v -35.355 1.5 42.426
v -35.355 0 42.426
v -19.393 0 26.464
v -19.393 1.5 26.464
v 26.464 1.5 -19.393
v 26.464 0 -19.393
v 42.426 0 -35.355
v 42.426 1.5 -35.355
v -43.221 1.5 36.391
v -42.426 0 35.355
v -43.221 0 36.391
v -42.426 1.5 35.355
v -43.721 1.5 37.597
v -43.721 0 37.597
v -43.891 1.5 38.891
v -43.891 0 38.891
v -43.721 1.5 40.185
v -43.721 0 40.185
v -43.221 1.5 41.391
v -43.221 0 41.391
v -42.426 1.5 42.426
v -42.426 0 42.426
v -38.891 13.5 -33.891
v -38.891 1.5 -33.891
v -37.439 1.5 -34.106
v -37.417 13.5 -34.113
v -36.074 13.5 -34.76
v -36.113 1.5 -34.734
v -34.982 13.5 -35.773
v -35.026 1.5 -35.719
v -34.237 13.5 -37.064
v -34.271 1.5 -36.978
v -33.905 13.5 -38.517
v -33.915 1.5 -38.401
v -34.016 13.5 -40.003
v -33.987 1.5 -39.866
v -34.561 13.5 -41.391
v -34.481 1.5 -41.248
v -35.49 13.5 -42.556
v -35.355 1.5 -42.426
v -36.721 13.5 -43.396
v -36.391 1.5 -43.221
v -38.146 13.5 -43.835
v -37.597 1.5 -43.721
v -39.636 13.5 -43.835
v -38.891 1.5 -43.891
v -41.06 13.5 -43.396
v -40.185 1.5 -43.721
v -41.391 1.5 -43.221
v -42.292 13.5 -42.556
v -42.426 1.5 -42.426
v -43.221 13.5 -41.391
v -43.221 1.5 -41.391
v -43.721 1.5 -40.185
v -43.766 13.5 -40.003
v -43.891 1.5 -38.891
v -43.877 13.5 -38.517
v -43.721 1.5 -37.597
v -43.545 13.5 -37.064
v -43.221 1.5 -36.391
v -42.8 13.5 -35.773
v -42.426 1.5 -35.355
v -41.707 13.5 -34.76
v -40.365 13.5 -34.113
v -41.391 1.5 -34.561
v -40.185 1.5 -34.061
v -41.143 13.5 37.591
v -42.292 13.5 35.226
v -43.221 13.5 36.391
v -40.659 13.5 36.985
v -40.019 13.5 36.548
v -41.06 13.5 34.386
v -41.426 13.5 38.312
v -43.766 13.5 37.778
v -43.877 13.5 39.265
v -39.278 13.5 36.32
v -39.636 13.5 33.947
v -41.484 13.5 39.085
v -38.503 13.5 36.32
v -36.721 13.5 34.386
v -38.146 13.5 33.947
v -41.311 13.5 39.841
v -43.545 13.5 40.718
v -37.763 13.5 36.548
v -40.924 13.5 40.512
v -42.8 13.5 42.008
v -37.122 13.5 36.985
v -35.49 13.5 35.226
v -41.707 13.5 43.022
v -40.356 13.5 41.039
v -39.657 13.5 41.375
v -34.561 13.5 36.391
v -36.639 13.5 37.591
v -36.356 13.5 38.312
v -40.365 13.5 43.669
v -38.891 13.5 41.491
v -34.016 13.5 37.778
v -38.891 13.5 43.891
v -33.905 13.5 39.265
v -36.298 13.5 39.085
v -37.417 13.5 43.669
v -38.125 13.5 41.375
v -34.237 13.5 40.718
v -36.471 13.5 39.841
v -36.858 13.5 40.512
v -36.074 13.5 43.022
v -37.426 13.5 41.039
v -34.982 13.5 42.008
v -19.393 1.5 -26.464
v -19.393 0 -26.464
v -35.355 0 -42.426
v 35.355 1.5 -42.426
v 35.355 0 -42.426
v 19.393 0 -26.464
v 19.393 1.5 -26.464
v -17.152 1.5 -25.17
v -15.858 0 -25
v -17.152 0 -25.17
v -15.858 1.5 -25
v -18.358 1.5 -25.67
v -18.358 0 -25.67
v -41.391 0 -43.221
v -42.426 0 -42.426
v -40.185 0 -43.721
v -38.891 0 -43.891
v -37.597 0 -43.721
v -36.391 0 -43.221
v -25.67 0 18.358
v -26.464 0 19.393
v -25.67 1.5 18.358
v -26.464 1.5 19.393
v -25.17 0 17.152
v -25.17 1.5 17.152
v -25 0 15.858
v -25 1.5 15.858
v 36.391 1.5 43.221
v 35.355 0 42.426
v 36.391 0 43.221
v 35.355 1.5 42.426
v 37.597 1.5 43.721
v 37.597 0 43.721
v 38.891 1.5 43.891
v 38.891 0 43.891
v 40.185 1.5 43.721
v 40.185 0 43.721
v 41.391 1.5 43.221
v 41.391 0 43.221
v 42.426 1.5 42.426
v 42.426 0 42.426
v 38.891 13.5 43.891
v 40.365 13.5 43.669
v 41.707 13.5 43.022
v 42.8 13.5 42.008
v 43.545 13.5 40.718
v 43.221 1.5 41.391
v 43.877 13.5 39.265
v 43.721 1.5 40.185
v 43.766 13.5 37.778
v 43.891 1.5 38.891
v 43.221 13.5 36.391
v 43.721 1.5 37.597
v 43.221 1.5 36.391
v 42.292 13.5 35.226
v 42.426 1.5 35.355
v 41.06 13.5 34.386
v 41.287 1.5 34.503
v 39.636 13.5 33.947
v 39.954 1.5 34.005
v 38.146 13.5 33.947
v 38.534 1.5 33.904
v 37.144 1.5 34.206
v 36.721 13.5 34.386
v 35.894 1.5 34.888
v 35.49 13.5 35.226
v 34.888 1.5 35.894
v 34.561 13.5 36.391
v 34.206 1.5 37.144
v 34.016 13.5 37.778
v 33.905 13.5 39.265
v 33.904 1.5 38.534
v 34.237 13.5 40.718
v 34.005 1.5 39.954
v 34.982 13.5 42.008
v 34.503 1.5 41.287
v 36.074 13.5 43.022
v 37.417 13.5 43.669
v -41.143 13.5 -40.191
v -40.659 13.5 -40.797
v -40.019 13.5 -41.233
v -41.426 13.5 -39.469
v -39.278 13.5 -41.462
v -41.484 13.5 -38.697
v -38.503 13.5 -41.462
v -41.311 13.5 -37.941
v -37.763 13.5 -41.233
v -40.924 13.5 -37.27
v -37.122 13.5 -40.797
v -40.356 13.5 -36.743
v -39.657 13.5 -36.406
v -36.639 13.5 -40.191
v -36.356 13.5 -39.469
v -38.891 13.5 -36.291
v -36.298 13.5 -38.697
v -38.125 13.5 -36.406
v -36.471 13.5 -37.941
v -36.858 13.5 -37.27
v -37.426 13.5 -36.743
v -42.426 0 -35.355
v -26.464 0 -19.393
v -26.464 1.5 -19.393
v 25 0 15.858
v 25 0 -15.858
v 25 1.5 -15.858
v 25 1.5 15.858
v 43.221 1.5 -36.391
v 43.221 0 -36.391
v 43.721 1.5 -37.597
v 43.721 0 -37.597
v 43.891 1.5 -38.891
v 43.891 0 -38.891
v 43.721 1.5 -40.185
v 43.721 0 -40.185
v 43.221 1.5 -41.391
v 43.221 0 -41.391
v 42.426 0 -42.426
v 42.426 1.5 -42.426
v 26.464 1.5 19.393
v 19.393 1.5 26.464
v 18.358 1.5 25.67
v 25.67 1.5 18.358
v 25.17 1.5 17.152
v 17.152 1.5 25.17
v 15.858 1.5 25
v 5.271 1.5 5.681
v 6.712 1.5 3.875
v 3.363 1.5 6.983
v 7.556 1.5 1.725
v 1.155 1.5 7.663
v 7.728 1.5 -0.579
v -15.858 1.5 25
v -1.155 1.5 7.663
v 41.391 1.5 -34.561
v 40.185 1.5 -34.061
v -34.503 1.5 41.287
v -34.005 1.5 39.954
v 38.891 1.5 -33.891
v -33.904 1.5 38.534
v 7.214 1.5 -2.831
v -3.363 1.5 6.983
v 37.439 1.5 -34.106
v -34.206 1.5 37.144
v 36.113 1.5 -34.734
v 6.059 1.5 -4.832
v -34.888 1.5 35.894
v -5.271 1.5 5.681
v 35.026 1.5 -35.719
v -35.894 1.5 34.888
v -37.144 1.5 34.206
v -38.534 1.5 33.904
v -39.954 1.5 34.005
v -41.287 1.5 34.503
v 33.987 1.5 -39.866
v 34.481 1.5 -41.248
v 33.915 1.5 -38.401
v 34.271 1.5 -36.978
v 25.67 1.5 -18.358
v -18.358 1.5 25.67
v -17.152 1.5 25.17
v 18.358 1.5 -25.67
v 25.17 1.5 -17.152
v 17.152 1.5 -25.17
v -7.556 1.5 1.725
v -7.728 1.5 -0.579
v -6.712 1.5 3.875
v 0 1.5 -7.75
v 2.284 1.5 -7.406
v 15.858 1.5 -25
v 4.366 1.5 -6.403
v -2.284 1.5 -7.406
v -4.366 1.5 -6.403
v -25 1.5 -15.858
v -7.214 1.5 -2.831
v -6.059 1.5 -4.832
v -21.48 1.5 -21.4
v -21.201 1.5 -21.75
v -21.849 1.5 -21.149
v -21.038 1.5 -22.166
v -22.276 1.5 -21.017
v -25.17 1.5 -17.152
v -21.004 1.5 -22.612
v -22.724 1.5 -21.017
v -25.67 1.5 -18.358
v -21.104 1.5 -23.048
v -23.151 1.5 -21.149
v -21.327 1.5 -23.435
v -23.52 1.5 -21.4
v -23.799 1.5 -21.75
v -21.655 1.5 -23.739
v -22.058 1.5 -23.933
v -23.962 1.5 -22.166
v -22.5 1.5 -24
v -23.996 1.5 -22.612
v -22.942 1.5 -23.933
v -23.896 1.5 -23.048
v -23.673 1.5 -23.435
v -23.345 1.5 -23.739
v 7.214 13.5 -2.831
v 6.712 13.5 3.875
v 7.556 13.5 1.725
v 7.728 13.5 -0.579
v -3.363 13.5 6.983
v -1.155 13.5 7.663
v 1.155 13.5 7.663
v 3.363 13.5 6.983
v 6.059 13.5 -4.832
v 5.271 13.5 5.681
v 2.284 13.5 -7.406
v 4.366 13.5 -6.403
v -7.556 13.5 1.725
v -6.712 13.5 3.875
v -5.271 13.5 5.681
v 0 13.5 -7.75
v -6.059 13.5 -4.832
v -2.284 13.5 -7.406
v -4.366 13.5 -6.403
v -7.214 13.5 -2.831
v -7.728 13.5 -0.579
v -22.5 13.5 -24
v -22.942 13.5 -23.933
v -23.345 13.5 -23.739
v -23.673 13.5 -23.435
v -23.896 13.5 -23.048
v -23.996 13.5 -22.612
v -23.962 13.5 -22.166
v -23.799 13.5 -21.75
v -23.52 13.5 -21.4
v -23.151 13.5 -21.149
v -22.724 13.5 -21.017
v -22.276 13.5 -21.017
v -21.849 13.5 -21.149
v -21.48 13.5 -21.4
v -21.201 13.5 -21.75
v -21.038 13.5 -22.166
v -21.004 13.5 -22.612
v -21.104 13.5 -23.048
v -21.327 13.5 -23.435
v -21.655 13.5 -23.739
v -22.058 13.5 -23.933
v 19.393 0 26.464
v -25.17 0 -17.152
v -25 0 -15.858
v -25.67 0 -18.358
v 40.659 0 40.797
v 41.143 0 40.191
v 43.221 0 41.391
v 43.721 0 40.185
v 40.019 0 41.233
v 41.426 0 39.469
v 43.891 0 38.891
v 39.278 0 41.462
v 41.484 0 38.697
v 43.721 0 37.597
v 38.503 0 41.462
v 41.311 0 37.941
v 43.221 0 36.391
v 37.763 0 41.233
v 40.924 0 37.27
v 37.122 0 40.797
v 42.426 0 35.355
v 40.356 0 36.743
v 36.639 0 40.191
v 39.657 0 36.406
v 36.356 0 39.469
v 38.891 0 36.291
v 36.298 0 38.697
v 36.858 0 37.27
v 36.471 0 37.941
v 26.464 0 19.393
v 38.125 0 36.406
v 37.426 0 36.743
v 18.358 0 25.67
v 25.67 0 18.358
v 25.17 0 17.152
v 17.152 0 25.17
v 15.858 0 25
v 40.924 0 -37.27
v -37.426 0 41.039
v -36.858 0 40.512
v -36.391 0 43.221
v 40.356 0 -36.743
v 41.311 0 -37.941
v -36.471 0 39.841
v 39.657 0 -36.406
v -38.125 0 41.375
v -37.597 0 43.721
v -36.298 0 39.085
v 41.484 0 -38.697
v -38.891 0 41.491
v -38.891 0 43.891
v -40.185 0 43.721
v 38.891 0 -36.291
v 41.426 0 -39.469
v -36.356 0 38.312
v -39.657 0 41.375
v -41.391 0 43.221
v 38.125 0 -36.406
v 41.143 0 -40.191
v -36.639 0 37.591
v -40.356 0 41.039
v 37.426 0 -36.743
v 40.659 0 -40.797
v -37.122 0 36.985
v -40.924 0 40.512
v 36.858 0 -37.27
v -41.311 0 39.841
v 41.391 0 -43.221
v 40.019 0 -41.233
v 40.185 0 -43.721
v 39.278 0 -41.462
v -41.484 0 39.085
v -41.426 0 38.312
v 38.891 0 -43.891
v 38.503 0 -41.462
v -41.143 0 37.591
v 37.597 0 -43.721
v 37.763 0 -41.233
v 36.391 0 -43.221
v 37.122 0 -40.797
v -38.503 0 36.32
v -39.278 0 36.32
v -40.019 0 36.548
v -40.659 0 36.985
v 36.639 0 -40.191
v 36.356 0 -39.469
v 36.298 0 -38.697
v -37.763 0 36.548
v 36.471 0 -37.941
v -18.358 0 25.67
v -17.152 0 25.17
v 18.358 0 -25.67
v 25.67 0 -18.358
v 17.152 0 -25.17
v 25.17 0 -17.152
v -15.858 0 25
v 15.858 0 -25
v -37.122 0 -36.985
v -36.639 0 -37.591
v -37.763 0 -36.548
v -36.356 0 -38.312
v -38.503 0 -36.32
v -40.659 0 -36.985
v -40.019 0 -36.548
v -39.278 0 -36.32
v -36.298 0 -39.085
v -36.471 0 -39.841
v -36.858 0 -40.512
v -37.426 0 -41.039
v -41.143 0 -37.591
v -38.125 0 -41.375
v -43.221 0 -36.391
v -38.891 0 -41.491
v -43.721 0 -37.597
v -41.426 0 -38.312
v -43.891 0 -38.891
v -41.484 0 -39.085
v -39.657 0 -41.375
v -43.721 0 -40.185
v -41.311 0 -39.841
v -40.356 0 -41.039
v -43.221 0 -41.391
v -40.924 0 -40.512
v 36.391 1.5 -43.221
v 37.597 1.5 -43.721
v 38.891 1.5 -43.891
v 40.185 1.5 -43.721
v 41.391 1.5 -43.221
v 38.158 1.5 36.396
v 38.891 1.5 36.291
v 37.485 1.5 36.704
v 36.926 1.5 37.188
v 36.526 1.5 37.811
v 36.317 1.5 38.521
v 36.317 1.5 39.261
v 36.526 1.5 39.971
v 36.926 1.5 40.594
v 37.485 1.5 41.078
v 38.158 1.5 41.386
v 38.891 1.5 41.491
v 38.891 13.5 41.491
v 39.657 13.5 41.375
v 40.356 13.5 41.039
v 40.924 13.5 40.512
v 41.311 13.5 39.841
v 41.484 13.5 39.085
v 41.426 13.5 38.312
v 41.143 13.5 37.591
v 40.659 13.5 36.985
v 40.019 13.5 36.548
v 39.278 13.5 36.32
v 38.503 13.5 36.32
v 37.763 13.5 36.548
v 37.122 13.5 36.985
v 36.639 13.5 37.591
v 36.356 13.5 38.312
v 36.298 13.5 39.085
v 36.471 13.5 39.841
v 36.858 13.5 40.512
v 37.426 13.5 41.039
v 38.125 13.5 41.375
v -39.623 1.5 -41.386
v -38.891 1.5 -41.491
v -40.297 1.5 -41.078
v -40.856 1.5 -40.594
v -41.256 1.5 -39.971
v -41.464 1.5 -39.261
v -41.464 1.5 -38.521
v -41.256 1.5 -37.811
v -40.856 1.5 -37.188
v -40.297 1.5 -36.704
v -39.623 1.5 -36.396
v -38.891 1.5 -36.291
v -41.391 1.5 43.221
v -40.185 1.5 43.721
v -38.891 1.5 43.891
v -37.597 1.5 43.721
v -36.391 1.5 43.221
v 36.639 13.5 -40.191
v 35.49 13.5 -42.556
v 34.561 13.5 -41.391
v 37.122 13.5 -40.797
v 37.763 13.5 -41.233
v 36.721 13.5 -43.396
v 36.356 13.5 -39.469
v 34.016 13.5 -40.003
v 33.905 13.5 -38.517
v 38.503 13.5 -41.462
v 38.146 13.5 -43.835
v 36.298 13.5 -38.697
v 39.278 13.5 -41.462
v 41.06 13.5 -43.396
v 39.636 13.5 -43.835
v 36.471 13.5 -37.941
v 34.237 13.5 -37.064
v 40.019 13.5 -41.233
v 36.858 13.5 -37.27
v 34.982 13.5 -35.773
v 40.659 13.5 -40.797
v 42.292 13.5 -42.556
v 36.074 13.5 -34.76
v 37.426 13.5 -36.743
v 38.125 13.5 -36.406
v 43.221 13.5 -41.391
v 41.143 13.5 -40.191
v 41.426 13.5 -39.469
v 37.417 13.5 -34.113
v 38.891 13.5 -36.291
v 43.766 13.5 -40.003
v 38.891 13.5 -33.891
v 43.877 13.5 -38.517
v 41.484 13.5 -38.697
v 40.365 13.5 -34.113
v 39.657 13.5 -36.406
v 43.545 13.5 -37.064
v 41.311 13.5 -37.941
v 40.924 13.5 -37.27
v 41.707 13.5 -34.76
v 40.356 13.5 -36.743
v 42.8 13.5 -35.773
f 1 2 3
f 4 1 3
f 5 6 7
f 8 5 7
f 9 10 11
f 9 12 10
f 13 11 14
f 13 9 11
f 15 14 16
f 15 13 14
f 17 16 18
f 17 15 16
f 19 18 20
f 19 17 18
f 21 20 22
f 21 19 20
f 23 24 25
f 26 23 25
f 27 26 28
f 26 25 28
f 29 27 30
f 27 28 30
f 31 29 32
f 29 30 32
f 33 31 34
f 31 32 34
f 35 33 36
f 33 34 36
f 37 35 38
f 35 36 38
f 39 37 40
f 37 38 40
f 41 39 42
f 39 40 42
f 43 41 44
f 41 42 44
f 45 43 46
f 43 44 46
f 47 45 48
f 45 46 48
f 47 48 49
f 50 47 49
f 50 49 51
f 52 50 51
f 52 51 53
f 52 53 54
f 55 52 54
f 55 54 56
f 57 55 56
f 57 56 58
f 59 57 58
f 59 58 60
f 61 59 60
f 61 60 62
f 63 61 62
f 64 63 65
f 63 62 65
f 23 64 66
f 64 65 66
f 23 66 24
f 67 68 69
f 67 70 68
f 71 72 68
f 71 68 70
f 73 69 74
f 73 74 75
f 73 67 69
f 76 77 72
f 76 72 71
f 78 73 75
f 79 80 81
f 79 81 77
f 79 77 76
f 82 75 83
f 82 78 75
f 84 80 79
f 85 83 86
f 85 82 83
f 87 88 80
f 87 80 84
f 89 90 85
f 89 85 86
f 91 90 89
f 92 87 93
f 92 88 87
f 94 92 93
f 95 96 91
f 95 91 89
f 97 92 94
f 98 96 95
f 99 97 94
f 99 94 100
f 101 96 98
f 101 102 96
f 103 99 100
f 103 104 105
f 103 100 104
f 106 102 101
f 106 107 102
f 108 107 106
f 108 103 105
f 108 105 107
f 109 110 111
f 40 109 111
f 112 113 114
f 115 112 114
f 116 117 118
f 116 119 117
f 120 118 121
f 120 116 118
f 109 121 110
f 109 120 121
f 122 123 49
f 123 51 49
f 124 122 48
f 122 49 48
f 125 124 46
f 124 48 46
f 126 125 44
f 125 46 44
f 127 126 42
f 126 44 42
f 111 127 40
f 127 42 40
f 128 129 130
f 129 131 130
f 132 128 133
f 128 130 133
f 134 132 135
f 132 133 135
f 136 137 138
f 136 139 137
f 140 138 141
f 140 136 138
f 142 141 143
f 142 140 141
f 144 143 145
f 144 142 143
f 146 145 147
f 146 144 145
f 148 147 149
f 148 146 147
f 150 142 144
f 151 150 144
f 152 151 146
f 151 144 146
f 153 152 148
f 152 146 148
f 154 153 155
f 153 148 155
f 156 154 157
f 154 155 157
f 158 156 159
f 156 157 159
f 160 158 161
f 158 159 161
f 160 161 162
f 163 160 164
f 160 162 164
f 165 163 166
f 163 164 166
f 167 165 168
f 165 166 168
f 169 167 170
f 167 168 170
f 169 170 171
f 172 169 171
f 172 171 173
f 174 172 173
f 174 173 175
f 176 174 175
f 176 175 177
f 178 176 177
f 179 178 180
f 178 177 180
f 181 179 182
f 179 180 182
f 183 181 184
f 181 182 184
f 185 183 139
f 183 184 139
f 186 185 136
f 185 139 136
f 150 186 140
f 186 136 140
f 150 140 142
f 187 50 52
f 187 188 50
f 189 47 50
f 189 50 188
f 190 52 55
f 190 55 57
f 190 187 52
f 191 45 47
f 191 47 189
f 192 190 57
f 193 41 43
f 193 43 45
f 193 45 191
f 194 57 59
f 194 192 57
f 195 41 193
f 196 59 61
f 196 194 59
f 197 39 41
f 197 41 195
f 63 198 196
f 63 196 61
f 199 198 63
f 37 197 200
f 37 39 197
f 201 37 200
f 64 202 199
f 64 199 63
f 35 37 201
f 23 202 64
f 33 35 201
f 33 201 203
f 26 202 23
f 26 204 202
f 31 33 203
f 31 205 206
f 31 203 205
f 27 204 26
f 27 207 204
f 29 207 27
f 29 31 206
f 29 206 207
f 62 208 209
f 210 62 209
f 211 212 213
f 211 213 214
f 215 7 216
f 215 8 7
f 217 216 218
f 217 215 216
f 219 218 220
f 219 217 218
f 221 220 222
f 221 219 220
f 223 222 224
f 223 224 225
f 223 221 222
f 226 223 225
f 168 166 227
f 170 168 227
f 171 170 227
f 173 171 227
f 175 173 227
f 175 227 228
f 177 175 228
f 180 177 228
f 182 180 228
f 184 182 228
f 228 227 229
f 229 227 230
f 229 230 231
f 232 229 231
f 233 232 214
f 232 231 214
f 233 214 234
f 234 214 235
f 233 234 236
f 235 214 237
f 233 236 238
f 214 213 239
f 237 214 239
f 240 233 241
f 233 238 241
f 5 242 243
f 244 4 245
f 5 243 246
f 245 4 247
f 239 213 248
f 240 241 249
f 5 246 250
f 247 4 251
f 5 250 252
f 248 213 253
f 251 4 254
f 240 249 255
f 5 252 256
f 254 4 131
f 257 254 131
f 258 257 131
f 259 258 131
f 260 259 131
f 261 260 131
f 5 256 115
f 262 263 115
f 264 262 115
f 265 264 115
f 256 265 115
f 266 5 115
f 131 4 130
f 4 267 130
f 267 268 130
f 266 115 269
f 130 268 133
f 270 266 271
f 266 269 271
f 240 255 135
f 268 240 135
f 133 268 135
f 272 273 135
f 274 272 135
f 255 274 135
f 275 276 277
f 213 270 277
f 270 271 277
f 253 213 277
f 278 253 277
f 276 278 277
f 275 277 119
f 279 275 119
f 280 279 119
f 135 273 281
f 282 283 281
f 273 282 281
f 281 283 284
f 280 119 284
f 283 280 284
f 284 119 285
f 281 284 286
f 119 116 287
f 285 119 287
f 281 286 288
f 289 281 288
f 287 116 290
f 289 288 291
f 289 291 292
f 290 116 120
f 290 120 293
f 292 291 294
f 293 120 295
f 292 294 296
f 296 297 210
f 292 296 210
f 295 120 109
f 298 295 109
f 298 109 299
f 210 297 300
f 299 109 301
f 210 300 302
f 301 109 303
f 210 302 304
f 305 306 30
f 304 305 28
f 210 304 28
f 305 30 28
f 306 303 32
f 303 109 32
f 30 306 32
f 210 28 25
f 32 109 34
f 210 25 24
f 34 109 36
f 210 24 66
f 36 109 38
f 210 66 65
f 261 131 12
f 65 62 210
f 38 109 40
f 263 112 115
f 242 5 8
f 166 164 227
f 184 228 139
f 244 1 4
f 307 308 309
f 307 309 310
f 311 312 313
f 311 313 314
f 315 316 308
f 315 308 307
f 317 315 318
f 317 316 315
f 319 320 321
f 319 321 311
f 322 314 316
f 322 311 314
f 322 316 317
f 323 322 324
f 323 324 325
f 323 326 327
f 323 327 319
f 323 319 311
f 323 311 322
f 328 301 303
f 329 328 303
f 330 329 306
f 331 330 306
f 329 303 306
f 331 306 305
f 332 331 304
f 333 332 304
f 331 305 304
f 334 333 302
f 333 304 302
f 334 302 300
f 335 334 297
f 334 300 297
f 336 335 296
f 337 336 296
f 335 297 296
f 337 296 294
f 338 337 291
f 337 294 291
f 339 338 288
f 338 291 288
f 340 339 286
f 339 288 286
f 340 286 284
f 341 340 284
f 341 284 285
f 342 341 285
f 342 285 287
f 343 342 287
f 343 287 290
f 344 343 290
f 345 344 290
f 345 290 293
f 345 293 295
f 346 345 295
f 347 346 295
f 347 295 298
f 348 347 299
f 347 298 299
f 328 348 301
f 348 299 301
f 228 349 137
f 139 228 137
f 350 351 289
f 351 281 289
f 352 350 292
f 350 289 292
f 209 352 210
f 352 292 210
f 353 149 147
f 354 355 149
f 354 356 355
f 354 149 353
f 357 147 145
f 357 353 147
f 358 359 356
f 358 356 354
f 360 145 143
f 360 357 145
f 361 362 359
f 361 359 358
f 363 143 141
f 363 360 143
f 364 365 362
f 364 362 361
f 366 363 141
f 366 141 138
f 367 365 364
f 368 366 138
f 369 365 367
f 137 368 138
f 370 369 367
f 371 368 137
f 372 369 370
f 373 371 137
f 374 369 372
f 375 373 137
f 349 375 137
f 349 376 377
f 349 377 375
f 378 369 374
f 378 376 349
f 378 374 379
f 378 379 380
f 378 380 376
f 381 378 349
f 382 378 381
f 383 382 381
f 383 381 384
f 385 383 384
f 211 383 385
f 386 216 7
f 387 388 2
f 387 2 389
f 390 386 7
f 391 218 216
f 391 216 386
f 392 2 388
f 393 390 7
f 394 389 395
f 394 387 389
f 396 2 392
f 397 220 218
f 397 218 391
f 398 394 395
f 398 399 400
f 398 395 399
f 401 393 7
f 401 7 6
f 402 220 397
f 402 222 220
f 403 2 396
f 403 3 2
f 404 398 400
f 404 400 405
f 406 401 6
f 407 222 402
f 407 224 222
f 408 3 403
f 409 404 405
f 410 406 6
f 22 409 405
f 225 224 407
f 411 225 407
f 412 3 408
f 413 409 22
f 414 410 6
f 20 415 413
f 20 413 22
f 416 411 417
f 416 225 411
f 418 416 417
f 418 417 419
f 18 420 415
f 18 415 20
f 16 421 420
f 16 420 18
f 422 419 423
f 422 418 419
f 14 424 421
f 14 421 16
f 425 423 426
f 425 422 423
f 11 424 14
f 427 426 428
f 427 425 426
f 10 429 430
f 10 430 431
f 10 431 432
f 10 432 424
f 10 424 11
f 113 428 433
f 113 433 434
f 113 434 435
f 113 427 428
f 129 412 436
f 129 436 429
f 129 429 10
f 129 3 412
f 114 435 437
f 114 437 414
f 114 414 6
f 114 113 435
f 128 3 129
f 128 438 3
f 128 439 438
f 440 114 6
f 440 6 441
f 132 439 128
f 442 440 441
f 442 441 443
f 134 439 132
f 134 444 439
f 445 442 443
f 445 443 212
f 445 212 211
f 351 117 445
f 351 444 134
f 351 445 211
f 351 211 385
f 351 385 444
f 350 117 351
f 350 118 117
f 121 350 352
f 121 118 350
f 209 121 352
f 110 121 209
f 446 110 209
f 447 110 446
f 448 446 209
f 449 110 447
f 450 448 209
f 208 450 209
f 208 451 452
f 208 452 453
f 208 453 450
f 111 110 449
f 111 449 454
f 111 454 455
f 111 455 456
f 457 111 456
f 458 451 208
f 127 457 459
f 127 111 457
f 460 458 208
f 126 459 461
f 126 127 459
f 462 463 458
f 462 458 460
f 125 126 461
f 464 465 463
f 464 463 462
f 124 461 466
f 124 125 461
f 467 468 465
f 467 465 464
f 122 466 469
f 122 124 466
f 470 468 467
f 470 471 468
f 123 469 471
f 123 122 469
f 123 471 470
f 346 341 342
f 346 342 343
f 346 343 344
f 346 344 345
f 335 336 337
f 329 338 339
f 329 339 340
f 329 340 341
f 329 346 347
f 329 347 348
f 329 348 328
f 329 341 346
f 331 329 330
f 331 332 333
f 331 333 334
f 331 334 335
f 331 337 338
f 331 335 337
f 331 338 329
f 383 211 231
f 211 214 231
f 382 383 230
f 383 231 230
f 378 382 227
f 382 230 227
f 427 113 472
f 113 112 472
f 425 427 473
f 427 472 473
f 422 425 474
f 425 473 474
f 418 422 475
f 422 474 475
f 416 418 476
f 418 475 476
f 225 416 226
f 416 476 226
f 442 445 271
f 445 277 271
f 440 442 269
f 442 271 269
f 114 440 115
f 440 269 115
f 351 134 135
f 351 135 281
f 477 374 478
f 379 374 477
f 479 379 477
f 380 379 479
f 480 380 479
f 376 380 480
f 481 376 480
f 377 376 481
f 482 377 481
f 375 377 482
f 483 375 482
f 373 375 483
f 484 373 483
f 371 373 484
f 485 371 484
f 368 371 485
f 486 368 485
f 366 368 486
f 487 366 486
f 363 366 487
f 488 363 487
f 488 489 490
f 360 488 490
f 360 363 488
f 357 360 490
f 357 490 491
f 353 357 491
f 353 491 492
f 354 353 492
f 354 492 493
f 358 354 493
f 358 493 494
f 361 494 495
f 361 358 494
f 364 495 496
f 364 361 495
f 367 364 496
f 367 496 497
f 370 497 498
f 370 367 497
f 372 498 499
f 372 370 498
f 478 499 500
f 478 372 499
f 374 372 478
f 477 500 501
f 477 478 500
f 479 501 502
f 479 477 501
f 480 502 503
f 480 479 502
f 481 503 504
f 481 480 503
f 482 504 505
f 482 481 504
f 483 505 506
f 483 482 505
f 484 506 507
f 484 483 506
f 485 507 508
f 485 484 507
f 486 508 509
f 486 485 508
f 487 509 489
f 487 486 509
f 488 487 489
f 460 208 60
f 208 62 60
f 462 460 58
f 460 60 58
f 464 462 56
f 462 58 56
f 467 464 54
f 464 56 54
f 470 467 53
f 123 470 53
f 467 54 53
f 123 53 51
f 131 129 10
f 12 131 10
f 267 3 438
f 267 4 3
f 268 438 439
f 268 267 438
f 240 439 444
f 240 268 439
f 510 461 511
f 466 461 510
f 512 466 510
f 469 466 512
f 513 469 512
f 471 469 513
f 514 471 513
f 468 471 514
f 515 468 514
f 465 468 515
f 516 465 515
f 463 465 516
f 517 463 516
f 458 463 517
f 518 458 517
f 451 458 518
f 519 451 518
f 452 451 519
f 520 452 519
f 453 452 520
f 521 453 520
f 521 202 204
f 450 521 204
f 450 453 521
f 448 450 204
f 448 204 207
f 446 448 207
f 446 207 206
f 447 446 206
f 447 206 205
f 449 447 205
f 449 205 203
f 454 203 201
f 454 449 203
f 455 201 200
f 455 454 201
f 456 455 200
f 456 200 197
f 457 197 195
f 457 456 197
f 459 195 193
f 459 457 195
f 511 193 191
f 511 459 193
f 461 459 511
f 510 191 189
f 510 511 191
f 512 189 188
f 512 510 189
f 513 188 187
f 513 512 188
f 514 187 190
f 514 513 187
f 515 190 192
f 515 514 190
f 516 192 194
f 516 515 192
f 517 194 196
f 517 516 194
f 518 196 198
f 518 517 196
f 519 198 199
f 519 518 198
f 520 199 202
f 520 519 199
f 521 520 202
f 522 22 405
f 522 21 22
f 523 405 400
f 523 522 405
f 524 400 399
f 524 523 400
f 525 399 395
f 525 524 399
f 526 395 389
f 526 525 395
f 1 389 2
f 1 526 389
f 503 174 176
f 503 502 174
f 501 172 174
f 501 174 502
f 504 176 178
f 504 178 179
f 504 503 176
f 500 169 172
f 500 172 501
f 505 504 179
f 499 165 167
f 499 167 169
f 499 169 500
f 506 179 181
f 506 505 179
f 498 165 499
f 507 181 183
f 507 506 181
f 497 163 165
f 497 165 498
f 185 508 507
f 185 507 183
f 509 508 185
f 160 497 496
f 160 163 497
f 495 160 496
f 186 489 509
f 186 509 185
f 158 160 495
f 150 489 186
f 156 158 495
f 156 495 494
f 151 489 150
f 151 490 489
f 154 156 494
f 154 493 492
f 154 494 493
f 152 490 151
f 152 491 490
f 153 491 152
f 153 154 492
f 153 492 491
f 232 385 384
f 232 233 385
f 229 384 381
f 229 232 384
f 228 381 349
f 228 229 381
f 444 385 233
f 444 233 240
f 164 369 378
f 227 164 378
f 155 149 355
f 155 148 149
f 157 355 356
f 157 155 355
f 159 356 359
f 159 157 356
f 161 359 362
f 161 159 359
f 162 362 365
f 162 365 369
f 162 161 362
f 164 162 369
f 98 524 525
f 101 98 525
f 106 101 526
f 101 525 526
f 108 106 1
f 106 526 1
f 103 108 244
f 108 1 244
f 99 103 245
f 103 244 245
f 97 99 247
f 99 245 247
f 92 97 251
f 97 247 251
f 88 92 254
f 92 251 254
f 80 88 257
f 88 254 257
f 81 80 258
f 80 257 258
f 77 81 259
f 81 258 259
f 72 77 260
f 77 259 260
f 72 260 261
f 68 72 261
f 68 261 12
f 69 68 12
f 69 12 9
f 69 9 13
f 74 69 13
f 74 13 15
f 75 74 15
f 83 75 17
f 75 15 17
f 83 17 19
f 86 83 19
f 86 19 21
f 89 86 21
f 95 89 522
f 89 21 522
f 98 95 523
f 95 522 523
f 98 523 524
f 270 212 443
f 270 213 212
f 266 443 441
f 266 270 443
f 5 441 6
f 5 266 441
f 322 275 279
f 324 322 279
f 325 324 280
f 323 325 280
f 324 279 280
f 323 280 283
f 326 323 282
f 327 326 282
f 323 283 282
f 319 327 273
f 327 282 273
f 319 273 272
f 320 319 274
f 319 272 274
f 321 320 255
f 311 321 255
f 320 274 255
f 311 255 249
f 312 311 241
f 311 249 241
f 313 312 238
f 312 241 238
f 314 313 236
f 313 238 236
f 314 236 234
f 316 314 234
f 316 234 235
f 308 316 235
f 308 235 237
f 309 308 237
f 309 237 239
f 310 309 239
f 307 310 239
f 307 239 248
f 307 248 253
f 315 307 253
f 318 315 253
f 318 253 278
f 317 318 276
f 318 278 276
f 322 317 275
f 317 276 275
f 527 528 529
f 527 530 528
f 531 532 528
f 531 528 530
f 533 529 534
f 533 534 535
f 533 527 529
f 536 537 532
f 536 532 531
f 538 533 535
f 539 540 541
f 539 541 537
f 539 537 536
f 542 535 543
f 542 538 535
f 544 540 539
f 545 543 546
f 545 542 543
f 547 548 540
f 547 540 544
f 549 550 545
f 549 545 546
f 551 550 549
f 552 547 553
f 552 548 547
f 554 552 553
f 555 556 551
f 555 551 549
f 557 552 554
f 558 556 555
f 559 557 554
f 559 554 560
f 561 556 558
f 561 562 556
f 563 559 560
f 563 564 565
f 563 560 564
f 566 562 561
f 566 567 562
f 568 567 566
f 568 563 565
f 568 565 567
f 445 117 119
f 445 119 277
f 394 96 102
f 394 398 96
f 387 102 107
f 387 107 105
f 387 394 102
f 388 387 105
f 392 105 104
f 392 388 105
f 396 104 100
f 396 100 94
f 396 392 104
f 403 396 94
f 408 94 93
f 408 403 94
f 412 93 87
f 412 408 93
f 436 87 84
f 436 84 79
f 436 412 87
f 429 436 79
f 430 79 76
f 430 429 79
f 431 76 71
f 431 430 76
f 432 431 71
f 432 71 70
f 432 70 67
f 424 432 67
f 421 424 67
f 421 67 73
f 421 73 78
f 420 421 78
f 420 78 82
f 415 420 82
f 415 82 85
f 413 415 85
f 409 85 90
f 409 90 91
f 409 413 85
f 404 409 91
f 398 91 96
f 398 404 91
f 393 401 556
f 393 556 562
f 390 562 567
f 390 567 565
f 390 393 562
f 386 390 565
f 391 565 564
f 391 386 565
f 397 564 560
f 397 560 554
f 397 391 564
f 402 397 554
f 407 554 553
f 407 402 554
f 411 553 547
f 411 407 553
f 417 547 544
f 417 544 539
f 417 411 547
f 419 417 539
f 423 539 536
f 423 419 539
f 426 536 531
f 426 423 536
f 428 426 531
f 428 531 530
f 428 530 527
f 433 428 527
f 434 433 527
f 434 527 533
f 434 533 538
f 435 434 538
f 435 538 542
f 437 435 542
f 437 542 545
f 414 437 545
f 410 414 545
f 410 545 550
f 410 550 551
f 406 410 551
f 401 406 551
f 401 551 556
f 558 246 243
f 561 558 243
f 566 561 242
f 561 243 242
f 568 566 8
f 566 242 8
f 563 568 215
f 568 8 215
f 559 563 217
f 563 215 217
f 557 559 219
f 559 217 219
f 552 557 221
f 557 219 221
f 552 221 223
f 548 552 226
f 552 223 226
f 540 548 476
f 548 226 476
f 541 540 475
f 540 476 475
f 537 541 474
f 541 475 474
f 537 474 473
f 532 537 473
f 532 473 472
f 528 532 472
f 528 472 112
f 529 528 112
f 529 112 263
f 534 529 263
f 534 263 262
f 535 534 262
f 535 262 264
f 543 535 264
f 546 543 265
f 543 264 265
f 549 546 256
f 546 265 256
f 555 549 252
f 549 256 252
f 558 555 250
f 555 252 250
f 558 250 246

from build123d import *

# Parameters (mm, degrees)
SKETCH1_W           = 50
SKETCH1_H           = 50
SKETCH1_R           = 8
BOSS_EXTRUDE1_DEPTH = 1.5
BOSS_EXTRUDE3_START = -1.5
SKETCH5_R           = 2.6
SKETCH5_R_2         = 8
BOSS_EXTRUDE3_DEPTH = 1.5
FILLET1_R           = 5
SKETCH6_R           = 5
SKETCH6_R_2         = 2.6
BOSS_EXTRUDE4_DEPTH = 12
SKETCH7_R           = 8.25
BOSS_EXTRUDE5_DEPTH = 1.5
SKETCH8_R           = 7.75
BOSS_EXTRUDE6_DEPTH = 12
SKETCH9_R           = 1.5
BOSS_EXTRUDE7_DEPTH = 12


with BuildPart() as part:
    # Sketch1 → Boss-Extrude1 (new body)
    with BuildSketch(Plane(origin=(0, 0, 0), x_dir=(1, 0, 0), z_dir=(0, 1, 0))):
        Rectangle(SKETCH1_W, SKETCH1_H)
        with Locations(Location((0, 0, 0), (0, 0, 270))):
            Circle(SKETCH1_R, mode=Mode.SUBTRACT)
    extrude(amount=BOSS_EXTRUDE1_DEPTH)

    # Sketch5 → Boss-Extrude3 (add)
    with BuildSketch(Plane(origin=(0, 1.5, 0), x_dir=(1, 0, 0), z_dir=(0, 1, 0)).offset(BOSS_EXTRUDE3_START)):
        Polygon((-42.426406871, -35.355339059), (-25, -17.928932188), (-25, 17.928932188), (-42.426406871, 35.355339059), (-45.961940777, 38.890872965), (-38.890872965, 45.961940777), (-35.355339059, 42.426406871), (-17.928932188, 25), (17.928932188, 25), (35.355339059, 42.426406871), (38.890872965, 45.961940777), (45.961940777, 38.890872965), (42.426406871, 35.355339059), (25, 17.928932188), (25, -17.928932188), (42.426406871, -35.355339059), (45.961940777, -38.890872965), (38.890872965, -45.961940777), (35.355339059, -42.426406871), (17.928932188, -25), (-17.928932188, -25), (-35.355339059, -42.426406871), (-38.890872965, -45.961940777), (-45.961940777, -38.890872965), align=None)
        with Locations(Location((-38.890872965, -38.890872965, 0), (0, 0, 270))):
            Circle(SKETCH5_R, mode=Mode.SUBTRACT)
        with Locations(Location((38.890872965, 38.890872965, 0), (0, 0, 270))):
            Circle(SKETCH5_R, mode=Mode.SUBTRACT)
        with Locations(Location((38.890872965, -38.890872965, 0), (0, 0, 90))):
            Circle(SKETCH5_R, mode=Mode.SUBTRACT)
        with Locations(Location((-38.890872965, 38.890872965, 0), (0, 0, 90))):
            Circle(SKETCH5_R, mode=Mode.SUBTRACT)
        with Locations(Location((0, 0, 0), (0, 0, 270))):
            Circle(SKETCH5_R_2, mode=Mode.SUBTRACT)
    extrude(amount=BOSS_EXTRUDE3_DEPTH)

    # Fillet1
    fillet1_edges = [part.edges().sort_by_distance(p)[0] for p in [
        (17.928932188, 0.75, 25),
        (38.890872965, 0.75, 45.961940777),
        (45.961940777, 0.75, 38.890872965),
        (25, 0.75, 17.928932188),
        (25, 0.75, -17.928932188),
        (45.961940777, 0.75, -38.890872965),
        (38.890872965, 0.75, -45.961940777),
        (17.928932188, 0.75, -25),
        (-17.928932188, 0.75, -25),
        (-38.890872965, 0.75, -45.961940777),
        (-45.961940777, 0.75, -38.890872965),
        (-25, 0.75, -17.928932188),
        (-25, 0.75, 17.928932188),
        (-45.961940777, 0.75, 38.890872965),
        (-38.890872965, 0.75, 45.961940777),
        (-17.928932188, 0.75, 25),
    ]]
    fillet(fillet1_edges, radius=FILLET1_R - 0.0001)  # a hair under: the kernel refuses the full size

    # Sketch6 → Boss-Extrude4 (add)
    # profile 1 of 4: a face of its own
    with BuildSketch(Plane(origin=(0, 1.5, 0), x_dir=(1, 0, 0), z_dir=(0, 1, 0))):
        with Locations(Location((-38.890872965, -38.890872965, 0), (0, 0, 270))):
            Circle(SKETCH6_R)
        with Locations(Location((-38.890872965, -38.890872965, 0), (0, 0, 270))):
            Circle(SKETCH6_R_2, mode=Mode.SUBTRACT)
    # profile 2 of 4: a face of its own
    with BuildSketch(Plane(origin=(0, 1.5, 0), x_dir=(1, 0, 0), z_dir=(0, 1, 0))):
        with Locations(Location((-38.890872965, 38.890872965, 0), (0, 0, 270))):
            Circle(SKETCH6_R)
        with Locations(Location((-38.890872965, 38.890872965, 0), (0, 0, 270))):
            Circle(SKETCH6_R_2, mode=Mode.SUBTRACT)
    # profile 3 of 4: a face of its own
    with BuildSketch(Plane(origin=(0, 1.5, 0), x_dir=(1, 0, 0), z_dir=(0, 1, 0))):
        with Locations(Location((38.890872965, 38.890872965, 0), (0, 0, 270))):
            Circle(SKETCH6_R)
        with Locations(Location((38.890872965, 38.890872965, 0), (0, 0, 270))):
            Circle(SKETCH6_R_2, mode=Mode.SUBTRACT)
    # profile 4 of 4: a face of its own
    with BuildSketch(Plane(origin=(0, 1.5, 0), x_dir=(1, 0, 0), z_dir=(0, 1, 0))):
        with Locations(Location((38.890872965, -38.890872965, 0), (0, 0, 270))):
            Circle(SKETCH6_R)
        with Locations(Location((38.890872965, -38.890872965, 0), (0, 0, 270))):
            Circle(SKETCH6_R_2, mode=Mode.SUBTRACT)
    extrude(amount=BOSS_EXTRUDE4_DEPTH)

    # Sketch7 → Boss-Extrude5 (add)
    with BuildSketch(Plane(origin=(0, 1.5, 0), x_dir=(1, 0, 0), z_dir=(0, 1, 0))):
        Circle(SKETCH7_R)
    extrude(amount=-BOSS_EXTRUDE5_DEPTH)

    # Sketch8 → Boss-Extrude6 (add)
    with BuildSketch(Plane(origin=(0, 1.5, 0), x_dir=(1, 0, 0), z_dir=(0, 1, 0))):
        with Locations(Location((0, 0, 0), (0, 0, 90))):
            Circle(SKETCH8_R)
    extrude(amount=BOSS_EXTRUDE6_DEPTH)

    # Sketch9 → Boss-Extrude7 (add)
    with BuildSketch(Plane(origin=(0, 1.5, 0), x_dir=(1, 0, 0), z_dir=(0, 1, 0))):
        with Locations(Location((-22.5, 22.5, 0), (0, 0, 90))):
            Circle(SKETCH9_R)
    extrude(amount=BOSS_EXTRUDE7_DEPTH)


solid = part.part
